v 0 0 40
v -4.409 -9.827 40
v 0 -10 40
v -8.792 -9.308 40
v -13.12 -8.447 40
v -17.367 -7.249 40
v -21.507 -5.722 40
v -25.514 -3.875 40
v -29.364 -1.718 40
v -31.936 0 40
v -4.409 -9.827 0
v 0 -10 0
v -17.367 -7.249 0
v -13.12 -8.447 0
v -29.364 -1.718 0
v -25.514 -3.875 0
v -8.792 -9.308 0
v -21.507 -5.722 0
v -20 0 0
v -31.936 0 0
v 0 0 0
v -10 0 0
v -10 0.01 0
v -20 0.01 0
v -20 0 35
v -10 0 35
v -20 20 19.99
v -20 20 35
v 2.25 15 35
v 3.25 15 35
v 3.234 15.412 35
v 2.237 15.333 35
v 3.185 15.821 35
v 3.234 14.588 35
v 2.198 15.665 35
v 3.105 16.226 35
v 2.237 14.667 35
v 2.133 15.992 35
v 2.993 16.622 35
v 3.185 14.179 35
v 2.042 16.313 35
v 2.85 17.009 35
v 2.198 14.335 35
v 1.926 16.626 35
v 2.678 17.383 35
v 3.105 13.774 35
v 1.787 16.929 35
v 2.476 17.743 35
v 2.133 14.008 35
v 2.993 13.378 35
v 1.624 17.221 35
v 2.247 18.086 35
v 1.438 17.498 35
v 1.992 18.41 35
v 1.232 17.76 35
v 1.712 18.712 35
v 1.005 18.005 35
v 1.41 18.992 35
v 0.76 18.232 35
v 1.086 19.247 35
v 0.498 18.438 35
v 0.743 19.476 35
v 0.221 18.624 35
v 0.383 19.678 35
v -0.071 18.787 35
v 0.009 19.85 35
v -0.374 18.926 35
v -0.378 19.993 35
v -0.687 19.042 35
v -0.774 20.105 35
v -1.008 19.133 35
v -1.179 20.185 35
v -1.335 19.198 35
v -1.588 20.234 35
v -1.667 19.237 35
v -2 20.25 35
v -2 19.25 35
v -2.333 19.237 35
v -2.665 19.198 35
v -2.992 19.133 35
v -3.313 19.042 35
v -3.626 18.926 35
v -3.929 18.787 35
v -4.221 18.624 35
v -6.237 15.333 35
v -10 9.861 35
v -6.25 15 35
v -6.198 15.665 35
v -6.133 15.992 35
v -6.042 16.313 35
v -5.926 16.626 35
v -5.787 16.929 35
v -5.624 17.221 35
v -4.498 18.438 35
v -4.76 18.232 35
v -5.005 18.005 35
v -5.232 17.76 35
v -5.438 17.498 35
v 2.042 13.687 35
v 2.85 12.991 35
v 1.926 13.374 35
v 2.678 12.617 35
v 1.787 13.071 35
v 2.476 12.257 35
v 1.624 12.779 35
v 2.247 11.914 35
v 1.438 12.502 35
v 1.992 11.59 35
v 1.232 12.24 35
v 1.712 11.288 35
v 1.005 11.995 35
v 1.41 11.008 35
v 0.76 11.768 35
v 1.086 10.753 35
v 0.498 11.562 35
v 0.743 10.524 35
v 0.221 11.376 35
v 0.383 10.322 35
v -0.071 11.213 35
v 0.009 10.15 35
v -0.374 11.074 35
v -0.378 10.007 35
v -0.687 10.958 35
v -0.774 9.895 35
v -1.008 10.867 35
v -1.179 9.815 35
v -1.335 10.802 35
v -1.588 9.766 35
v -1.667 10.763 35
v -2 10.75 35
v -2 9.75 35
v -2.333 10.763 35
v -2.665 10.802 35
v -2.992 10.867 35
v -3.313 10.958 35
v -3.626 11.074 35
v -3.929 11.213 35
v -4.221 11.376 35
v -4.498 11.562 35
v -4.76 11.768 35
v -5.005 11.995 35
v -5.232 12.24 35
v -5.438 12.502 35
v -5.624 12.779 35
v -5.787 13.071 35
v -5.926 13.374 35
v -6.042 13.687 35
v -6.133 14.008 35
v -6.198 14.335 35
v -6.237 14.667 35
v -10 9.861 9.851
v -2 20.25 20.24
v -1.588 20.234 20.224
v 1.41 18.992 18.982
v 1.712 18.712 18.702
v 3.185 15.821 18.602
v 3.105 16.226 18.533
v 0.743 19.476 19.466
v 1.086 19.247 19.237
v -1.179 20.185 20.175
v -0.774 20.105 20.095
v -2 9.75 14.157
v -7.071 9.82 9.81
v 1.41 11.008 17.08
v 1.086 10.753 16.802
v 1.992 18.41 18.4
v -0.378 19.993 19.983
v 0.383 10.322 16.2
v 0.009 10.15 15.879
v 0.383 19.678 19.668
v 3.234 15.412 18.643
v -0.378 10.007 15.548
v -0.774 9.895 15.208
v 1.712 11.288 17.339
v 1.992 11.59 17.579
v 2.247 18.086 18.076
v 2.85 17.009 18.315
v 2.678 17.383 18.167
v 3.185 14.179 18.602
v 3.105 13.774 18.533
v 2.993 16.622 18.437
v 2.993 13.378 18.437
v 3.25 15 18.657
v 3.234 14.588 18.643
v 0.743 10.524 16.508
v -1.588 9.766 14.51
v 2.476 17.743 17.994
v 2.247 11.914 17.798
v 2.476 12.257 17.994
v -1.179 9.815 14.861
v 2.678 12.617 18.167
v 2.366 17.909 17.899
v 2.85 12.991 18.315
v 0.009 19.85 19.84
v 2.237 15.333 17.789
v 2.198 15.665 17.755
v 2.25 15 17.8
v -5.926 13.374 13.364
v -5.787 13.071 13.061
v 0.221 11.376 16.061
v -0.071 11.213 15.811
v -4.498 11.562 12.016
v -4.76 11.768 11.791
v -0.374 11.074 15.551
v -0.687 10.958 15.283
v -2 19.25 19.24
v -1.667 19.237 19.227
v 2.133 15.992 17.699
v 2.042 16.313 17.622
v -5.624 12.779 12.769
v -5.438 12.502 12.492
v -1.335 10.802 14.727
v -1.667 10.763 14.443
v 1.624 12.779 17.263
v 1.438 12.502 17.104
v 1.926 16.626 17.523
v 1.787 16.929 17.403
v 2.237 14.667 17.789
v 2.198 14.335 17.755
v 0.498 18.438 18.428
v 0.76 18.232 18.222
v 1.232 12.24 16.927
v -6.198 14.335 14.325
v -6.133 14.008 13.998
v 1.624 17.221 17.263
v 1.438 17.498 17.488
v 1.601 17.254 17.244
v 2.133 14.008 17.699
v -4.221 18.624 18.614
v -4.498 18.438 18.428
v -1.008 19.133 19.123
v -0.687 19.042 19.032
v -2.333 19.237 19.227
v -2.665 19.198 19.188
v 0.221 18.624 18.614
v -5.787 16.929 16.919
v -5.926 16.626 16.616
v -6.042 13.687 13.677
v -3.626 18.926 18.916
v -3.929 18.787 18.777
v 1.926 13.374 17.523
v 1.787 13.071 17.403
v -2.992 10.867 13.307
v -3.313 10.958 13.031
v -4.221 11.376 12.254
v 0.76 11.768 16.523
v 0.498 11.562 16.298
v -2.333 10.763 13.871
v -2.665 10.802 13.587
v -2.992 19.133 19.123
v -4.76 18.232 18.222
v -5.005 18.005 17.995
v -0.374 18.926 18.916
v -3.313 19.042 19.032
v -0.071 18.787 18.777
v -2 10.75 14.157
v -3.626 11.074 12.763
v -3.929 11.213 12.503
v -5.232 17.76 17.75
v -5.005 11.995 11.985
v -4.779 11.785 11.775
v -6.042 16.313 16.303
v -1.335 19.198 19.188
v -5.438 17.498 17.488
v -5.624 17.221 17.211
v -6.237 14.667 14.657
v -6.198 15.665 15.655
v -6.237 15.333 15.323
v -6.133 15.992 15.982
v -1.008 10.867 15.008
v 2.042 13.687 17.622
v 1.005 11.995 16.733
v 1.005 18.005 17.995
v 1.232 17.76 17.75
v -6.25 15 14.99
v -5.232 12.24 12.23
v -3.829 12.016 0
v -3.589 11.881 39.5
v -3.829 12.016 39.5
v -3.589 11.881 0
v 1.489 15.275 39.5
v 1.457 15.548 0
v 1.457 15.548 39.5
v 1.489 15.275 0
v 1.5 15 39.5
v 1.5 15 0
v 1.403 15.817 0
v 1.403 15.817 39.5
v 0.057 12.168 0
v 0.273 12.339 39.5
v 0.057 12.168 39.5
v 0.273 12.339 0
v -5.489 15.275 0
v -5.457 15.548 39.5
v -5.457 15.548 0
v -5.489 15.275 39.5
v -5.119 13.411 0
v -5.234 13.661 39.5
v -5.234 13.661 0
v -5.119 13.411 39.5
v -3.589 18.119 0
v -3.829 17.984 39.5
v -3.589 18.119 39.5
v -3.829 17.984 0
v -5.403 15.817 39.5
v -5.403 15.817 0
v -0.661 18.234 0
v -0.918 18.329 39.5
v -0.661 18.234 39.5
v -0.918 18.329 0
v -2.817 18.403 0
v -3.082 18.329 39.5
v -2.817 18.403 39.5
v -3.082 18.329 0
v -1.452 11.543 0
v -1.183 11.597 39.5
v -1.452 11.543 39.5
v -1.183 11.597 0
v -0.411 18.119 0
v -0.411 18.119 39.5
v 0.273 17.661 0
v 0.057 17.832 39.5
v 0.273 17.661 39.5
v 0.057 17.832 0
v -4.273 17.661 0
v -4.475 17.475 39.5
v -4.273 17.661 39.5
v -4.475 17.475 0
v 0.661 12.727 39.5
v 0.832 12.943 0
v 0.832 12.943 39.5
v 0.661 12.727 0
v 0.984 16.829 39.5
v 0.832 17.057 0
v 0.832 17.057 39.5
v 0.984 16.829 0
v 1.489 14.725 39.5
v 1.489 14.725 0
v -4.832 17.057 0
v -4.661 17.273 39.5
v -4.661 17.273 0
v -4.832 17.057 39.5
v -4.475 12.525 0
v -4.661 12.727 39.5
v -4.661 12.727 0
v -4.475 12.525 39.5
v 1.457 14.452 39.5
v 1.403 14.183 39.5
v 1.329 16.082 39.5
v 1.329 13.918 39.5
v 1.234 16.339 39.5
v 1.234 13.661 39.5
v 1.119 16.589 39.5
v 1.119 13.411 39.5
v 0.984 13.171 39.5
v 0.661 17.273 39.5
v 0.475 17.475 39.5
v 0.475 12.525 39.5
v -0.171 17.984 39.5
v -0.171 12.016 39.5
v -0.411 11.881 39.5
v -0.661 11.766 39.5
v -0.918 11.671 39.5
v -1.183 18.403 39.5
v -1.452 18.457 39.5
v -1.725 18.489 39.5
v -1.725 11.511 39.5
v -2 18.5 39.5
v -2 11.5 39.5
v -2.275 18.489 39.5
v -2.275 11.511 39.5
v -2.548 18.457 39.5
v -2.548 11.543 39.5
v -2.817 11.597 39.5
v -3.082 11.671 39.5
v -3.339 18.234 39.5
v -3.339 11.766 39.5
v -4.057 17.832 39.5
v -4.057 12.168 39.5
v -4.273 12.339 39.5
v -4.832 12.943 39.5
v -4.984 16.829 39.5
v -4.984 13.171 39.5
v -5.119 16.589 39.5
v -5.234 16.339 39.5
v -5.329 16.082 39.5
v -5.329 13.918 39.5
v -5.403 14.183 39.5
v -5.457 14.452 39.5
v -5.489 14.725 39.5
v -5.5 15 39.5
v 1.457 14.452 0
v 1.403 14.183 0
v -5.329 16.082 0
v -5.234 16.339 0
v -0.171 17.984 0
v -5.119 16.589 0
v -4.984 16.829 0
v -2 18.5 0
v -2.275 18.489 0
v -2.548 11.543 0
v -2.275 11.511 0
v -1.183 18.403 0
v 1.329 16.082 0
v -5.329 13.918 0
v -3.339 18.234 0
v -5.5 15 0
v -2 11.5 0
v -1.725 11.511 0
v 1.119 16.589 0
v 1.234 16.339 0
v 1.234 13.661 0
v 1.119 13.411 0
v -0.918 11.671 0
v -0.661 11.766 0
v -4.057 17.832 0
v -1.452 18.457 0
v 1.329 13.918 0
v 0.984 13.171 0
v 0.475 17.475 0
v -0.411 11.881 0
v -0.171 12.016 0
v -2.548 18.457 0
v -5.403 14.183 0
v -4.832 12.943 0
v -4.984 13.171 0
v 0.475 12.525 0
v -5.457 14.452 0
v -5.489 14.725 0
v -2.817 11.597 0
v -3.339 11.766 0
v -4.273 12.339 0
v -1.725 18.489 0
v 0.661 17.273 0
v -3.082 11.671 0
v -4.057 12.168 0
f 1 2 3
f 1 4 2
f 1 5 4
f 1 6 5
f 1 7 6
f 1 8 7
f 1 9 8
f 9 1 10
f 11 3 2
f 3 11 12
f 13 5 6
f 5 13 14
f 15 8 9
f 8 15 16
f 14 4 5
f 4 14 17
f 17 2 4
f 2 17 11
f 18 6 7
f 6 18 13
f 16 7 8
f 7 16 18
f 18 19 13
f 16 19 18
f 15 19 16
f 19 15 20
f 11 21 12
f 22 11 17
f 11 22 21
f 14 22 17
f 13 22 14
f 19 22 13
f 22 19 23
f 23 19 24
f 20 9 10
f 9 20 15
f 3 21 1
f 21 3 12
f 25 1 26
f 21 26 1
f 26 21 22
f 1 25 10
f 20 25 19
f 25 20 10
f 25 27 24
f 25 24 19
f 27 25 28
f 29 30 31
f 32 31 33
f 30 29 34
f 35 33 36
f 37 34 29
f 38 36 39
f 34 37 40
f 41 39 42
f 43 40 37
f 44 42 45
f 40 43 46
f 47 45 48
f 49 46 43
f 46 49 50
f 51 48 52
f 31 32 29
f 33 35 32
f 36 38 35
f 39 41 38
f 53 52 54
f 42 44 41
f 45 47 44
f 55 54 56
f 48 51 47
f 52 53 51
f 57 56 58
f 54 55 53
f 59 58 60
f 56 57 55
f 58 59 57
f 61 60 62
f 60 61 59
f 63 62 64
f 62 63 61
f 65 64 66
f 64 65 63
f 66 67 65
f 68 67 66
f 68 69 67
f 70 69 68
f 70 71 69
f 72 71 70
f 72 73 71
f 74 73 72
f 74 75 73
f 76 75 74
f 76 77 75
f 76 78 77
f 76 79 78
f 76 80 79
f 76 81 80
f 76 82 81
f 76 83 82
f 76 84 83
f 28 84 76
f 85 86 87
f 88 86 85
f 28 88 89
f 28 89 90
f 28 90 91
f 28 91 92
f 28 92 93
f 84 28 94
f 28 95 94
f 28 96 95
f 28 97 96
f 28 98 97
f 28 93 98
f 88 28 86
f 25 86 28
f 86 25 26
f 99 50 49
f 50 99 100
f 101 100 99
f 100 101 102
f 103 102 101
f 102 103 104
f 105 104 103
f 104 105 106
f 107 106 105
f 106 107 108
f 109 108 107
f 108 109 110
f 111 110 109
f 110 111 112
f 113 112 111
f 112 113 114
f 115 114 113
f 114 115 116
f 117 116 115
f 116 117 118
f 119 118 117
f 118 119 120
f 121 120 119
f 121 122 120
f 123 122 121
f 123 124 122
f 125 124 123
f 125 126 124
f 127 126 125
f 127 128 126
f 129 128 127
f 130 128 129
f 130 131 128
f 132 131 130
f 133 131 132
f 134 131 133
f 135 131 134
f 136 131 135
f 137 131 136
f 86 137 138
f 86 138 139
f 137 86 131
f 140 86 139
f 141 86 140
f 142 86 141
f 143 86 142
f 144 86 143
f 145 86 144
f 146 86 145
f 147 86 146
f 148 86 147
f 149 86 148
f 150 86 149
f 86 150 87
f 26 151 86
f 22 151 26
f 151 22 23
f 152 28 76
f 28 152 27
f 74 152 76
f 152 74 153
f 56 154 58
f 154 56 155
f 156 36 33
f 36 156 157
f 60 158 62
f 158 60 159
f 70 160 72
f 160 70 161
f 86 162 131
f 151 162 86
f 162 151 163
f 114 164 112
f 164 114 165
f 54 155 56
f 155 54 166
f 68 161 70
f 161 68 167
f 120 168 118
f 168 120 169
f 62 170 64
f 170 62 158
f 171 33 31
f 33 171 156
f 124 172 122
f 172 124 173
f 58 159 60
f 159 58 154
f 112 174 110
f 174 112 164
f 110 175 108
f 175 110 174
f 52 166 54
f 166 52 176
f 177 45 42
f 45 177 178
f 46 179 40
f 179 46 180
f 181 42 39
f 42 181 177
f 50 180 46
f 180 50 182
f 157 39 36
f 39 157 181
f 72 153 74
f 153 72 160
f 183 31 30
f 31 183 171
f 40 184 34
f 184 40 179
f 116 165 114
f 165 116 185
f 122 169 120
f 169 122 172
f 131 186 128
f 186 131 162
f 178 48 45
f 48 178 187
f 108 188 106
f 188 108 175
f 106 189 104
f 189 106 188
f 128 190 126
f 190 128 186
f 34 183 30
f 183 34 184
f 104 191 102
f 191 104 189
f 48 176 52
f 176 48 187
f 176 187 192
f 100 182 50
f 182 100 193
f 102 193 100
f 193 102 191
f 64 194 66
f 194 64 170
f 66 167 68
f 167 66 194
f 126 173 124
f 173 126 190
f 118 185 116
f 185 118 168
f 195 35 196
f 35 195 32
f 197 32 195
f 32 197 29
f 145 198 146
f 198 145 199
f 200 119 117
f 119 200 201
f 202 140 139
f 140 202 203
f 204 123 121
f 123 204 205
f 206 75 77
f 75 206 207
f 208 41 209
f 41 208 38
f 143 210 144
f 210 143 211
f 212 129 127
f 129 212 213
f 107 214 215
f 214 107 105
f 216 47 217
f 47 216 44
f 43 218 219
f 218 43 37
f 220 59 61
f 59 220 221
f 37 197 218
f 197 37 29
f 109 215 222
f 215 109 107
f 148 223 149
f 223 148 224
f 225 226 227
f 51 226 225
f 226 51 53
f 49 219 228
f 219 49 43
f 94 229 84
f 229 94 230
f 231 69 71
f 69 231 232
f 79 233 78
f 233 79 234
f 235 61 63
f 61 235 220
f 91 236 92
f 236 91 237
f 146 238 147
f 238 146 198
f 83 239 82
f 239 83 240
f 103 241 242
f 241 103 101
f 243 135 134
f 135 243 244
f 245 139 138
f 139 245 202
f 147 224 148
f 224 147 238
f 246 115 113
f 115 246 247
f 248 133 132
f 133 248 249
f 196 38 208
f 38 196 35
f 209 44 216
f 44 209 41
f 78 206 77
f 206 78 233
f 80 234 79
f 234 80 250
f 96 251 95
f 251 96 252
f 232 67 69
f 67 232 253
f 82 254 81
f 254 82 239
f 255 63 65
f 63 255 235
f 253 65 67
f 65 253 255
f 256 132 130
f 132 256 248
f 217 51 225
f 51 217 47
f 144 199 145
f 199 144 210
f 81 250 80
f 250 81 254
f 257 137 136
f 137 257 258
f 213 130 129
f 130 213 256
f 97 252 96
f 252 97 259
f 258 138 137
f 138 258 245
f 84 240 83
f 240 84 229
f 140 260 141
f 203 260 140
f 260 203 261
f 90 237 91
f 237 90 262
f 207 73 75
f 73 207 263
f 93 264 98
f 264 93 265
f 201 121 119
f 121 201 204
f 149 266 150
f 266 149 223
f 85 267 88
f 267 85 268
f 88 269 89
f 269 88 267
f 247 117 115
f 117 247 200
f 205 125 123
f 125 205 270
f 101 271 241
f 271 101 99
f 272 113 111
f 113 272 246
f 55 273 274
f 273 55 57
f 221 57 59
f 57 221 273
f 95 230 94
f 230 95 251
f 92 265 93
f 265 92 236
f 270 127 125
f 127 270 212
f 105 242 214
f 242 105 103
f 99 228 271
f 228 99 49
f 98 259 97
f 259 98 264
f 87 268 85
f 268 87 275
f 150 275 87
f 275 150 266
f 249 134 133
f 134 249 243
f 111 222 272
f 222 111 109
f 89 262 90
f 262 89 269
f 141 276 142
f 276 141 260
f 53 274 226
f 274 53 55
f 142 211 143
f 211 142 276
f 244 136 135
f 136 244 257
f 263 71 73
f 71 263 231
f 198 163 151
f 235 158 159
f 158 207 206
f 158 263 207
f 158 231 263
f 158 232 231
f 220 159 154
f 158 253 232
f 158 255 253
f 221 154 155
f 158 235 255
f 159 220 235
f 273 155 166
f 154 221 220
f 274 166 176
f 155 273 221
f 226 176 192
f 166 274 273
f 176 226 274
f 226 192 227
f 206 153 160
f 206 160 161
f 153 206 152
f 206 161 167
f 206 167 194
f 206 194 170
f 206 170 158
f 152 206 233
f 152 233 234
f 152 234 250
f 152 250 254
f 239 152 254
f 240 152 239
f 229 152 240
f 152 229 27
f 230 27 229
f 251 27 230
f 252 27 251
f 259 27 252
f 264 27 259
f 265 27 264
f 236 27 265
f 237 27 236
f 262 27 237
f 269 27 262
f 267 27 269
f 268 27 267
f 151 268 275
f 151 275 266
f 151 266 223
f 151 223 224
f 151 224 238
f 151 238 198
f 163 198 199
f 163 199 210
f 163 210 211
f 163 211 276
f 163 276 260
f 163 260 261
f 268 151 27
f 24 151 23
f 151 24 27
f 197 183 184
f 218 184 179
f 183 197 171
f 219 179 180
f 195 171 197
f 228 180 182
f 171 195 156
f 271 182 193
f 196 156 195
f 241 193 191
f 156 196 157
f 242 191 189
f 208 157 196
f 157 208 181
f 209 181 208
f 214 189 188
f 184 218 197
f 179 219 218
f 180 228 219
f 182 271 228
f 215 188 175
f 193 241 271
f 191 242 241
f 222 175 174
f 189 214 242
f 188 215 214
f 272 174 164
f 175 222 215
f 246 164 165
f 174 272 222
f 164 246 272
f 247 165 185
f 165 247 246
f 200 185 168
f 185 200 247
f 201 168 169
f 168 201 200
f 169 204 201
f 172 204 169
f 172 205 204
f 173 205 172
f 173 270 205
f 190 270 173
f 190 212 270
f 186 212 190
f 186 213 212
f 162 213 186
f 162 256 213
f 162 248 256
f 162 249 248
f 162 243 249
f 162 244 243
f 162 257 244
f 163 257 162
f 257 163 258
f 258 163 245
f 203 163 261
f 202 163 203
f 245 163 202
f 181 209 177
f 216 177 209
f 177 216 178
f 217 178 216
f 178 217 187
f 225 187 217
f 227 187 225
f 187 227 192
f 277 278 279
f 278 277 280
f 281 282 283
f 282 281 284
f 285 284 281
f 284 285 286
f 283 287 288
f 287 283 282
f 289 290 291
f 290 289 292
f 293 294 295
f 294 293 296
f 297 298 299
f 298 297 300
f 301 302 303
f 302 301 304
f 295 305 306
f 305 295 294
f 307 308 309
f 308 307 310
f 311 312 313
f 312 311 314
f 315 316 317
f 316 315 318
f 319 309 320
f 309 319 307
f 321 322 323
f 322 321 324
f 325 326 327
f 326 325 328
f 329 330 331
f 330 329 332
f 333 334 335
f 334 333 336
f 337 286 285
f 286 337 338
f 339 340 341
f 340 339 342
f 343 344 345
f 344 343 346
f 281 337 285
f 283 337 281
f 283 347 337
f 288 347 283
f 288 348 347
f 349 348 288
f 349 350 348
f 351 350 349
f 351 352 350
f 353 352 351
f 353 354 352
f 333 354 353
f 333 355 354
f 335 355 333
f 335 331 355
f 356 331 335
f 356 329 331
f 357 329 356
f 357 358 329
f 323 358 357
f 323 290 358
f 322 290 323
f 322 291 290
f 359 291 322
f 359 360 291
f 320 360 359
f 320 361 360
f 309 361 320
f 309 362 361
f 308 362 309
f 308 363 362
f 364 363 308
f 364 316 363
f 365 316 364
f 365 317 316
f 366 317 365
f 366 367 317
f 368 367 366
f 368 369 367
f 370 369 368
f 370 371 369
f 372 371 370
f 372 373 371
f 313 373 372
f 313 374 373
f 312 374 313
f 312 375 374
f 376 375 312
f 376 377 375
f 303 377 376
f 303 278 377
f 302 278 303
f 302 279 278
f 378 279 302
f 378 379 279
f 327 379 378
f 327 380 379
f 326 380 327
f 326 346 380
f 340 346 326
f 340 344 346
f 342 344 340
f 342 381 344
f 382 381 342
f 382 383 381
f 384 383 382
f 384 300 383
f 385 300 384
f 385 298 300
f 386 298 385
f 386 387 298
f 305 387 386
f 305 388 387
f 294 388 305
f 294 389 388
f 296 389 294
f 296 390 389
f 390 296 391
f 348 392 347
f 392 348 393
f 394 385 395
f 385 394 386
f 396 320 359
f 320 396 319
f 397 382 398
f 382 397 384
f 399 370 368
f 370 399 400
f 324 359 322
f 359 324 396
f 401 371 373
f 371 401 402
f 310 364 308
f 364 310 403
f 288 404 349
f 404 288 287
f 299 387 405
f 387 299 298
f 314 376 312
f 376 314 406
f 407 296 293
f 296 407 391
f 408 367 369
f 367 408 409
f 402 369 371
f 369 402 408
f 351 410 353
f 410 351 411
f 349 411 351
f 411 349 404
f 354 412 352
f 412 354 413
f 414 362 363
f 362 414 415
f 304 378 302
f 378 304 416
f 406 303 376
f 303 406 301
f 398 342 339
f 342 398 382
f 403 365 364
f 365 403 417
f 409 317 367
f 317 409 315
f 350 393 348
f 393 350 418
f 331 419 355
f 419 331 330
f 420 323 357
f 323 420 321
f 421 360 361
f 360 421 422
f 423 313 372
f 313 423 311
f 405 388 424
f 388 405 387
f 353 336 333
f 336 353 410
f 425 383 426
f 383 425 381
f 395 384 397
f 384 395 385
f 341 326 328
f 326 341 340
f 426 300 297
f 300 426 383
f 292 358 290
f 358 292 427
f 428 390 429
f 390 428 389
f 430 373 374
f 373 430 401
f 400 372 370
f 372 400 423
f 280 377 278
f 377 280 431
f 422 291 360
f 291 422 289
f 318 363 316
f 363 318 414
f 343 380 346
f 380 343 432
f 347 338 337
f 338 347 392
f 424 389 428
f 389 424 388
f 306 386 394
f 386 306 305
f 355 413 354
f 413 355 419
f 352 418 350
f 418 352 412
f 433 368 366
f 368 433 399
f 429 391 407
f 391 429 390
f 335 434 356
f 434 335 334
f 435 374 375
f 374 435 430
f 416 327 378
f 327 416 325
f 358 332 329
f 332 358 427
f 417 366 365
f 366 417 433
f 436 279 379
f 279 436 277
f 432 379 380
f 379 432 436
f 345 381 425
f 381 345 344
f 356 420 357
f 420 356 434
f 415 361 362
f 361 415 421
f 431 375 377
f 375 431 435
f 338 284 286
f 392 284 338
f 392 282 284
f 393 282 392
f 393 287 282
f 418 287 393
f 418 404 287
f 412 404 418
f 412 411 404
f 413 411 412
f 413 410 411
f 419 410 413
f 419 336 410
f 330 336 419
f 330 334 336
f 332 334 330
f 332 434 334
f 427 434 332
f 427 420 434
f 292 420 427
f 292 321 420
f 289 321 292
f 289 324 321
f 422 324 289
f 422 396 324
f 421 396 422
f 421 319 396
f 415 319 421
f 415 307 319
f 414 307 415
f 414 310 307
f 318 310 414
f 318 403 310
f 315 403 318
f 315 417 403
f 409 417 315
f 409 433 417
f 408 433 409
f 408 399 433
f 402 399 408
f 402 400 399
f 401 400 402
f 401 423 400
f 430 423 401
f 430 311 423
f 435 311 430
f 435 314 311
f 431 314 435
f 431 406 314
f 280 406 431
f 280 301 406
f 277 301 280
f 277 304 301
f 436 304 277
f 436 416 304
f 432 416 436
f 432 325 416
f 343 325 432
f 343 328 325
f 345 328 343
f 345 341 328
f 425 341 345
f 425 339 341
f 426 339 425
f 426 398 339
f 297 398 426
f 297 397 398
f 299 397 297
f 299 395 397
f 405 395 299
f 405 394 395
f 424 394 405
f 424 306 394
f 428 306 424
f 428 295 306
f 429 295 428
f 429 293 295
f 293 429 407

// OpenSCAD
$fn = 80;

//feet width
fw = 32;

c = fw*2;

//feet height
fh = 10;

//feet thickness
fth = 40;

//feet diameter
fd = 2*(fh/2 + c*c/(8*fh));

//leg length
ll = 20;

//leg width
lw = 10;

//distance between feet
dbf = .75+.25;


module foot()
{
translate([0,fd/2-fh,0])
intersection()
{
cylinder(d=fd, h=fth);
translate([0,-fd/2,-.2])
color("red")
cube([fw, fh, fth+2]);
}
}

module front_leg(h=fth)
{
  foot();
  translate([fw/2-lw/2+1,-8,0])
  rotate(20)
  cube([lw, ll+3, h]);
}

module hind_leg()
{
  //top give
  tg = 5;
  difference()
  {
  union()
  {
  
  mirror(1)
  {
  foot();
  translate([fw/2-lw/2-1,0,0])
  cube([lw, ll, fth-tg]);
  }
  hull()
  {
  translate([-fw/2-lw/2+1, ll-10, 0])
  cube([lw, 10, fth-tg]);
  translate([-2, ll-5, 0])
  cylinder(d=8+2.5, h=fth-tg);
  }
  }
  
  translate([-2, ll-5, 0])
  cylinder(d=8.5, h=fth+10);
  
 translate([-25,0,-.01])
mirror([0,0,1])
  rotate([0,90,0])
    linear_extrude(height=30)
  polygon(points=[[0,0], [0,22], [22,22]], paths=[[0,1,2]]);
  
  
  
  translate([2,9.9-.2,19.3])  
  rotate([0,90,90])
  linear_extrude(height=14)
  polygon(points=[[12,12], [12,-2], [0,-2]], paths=[[0,1,2]]);
    }
    
  translate([-2,ll-5,0])
  cylinder(d=4+3, h=fth-.5);
    




  
}

module body()
{
  difference()
  {
  union()
  {
  translate([-55,5,0])
  linear_extrude(height=fth)
  import("duck_simple.dxf");
      
  translate([dbf,0,0])
  front_leg();
  }
    
  translate([-27,0,3])
  cube([22+7+2,30, fth-10+3]);
      
  
  //translate([-2, ll-5, -.5])
  //cylinder(d=4+.6, h=fth+1);
  }
  
}

//body();


hind_leg();


/*
foot();
mirror([1,0,0])
translate([dbf,0,0])
foot();
*/
